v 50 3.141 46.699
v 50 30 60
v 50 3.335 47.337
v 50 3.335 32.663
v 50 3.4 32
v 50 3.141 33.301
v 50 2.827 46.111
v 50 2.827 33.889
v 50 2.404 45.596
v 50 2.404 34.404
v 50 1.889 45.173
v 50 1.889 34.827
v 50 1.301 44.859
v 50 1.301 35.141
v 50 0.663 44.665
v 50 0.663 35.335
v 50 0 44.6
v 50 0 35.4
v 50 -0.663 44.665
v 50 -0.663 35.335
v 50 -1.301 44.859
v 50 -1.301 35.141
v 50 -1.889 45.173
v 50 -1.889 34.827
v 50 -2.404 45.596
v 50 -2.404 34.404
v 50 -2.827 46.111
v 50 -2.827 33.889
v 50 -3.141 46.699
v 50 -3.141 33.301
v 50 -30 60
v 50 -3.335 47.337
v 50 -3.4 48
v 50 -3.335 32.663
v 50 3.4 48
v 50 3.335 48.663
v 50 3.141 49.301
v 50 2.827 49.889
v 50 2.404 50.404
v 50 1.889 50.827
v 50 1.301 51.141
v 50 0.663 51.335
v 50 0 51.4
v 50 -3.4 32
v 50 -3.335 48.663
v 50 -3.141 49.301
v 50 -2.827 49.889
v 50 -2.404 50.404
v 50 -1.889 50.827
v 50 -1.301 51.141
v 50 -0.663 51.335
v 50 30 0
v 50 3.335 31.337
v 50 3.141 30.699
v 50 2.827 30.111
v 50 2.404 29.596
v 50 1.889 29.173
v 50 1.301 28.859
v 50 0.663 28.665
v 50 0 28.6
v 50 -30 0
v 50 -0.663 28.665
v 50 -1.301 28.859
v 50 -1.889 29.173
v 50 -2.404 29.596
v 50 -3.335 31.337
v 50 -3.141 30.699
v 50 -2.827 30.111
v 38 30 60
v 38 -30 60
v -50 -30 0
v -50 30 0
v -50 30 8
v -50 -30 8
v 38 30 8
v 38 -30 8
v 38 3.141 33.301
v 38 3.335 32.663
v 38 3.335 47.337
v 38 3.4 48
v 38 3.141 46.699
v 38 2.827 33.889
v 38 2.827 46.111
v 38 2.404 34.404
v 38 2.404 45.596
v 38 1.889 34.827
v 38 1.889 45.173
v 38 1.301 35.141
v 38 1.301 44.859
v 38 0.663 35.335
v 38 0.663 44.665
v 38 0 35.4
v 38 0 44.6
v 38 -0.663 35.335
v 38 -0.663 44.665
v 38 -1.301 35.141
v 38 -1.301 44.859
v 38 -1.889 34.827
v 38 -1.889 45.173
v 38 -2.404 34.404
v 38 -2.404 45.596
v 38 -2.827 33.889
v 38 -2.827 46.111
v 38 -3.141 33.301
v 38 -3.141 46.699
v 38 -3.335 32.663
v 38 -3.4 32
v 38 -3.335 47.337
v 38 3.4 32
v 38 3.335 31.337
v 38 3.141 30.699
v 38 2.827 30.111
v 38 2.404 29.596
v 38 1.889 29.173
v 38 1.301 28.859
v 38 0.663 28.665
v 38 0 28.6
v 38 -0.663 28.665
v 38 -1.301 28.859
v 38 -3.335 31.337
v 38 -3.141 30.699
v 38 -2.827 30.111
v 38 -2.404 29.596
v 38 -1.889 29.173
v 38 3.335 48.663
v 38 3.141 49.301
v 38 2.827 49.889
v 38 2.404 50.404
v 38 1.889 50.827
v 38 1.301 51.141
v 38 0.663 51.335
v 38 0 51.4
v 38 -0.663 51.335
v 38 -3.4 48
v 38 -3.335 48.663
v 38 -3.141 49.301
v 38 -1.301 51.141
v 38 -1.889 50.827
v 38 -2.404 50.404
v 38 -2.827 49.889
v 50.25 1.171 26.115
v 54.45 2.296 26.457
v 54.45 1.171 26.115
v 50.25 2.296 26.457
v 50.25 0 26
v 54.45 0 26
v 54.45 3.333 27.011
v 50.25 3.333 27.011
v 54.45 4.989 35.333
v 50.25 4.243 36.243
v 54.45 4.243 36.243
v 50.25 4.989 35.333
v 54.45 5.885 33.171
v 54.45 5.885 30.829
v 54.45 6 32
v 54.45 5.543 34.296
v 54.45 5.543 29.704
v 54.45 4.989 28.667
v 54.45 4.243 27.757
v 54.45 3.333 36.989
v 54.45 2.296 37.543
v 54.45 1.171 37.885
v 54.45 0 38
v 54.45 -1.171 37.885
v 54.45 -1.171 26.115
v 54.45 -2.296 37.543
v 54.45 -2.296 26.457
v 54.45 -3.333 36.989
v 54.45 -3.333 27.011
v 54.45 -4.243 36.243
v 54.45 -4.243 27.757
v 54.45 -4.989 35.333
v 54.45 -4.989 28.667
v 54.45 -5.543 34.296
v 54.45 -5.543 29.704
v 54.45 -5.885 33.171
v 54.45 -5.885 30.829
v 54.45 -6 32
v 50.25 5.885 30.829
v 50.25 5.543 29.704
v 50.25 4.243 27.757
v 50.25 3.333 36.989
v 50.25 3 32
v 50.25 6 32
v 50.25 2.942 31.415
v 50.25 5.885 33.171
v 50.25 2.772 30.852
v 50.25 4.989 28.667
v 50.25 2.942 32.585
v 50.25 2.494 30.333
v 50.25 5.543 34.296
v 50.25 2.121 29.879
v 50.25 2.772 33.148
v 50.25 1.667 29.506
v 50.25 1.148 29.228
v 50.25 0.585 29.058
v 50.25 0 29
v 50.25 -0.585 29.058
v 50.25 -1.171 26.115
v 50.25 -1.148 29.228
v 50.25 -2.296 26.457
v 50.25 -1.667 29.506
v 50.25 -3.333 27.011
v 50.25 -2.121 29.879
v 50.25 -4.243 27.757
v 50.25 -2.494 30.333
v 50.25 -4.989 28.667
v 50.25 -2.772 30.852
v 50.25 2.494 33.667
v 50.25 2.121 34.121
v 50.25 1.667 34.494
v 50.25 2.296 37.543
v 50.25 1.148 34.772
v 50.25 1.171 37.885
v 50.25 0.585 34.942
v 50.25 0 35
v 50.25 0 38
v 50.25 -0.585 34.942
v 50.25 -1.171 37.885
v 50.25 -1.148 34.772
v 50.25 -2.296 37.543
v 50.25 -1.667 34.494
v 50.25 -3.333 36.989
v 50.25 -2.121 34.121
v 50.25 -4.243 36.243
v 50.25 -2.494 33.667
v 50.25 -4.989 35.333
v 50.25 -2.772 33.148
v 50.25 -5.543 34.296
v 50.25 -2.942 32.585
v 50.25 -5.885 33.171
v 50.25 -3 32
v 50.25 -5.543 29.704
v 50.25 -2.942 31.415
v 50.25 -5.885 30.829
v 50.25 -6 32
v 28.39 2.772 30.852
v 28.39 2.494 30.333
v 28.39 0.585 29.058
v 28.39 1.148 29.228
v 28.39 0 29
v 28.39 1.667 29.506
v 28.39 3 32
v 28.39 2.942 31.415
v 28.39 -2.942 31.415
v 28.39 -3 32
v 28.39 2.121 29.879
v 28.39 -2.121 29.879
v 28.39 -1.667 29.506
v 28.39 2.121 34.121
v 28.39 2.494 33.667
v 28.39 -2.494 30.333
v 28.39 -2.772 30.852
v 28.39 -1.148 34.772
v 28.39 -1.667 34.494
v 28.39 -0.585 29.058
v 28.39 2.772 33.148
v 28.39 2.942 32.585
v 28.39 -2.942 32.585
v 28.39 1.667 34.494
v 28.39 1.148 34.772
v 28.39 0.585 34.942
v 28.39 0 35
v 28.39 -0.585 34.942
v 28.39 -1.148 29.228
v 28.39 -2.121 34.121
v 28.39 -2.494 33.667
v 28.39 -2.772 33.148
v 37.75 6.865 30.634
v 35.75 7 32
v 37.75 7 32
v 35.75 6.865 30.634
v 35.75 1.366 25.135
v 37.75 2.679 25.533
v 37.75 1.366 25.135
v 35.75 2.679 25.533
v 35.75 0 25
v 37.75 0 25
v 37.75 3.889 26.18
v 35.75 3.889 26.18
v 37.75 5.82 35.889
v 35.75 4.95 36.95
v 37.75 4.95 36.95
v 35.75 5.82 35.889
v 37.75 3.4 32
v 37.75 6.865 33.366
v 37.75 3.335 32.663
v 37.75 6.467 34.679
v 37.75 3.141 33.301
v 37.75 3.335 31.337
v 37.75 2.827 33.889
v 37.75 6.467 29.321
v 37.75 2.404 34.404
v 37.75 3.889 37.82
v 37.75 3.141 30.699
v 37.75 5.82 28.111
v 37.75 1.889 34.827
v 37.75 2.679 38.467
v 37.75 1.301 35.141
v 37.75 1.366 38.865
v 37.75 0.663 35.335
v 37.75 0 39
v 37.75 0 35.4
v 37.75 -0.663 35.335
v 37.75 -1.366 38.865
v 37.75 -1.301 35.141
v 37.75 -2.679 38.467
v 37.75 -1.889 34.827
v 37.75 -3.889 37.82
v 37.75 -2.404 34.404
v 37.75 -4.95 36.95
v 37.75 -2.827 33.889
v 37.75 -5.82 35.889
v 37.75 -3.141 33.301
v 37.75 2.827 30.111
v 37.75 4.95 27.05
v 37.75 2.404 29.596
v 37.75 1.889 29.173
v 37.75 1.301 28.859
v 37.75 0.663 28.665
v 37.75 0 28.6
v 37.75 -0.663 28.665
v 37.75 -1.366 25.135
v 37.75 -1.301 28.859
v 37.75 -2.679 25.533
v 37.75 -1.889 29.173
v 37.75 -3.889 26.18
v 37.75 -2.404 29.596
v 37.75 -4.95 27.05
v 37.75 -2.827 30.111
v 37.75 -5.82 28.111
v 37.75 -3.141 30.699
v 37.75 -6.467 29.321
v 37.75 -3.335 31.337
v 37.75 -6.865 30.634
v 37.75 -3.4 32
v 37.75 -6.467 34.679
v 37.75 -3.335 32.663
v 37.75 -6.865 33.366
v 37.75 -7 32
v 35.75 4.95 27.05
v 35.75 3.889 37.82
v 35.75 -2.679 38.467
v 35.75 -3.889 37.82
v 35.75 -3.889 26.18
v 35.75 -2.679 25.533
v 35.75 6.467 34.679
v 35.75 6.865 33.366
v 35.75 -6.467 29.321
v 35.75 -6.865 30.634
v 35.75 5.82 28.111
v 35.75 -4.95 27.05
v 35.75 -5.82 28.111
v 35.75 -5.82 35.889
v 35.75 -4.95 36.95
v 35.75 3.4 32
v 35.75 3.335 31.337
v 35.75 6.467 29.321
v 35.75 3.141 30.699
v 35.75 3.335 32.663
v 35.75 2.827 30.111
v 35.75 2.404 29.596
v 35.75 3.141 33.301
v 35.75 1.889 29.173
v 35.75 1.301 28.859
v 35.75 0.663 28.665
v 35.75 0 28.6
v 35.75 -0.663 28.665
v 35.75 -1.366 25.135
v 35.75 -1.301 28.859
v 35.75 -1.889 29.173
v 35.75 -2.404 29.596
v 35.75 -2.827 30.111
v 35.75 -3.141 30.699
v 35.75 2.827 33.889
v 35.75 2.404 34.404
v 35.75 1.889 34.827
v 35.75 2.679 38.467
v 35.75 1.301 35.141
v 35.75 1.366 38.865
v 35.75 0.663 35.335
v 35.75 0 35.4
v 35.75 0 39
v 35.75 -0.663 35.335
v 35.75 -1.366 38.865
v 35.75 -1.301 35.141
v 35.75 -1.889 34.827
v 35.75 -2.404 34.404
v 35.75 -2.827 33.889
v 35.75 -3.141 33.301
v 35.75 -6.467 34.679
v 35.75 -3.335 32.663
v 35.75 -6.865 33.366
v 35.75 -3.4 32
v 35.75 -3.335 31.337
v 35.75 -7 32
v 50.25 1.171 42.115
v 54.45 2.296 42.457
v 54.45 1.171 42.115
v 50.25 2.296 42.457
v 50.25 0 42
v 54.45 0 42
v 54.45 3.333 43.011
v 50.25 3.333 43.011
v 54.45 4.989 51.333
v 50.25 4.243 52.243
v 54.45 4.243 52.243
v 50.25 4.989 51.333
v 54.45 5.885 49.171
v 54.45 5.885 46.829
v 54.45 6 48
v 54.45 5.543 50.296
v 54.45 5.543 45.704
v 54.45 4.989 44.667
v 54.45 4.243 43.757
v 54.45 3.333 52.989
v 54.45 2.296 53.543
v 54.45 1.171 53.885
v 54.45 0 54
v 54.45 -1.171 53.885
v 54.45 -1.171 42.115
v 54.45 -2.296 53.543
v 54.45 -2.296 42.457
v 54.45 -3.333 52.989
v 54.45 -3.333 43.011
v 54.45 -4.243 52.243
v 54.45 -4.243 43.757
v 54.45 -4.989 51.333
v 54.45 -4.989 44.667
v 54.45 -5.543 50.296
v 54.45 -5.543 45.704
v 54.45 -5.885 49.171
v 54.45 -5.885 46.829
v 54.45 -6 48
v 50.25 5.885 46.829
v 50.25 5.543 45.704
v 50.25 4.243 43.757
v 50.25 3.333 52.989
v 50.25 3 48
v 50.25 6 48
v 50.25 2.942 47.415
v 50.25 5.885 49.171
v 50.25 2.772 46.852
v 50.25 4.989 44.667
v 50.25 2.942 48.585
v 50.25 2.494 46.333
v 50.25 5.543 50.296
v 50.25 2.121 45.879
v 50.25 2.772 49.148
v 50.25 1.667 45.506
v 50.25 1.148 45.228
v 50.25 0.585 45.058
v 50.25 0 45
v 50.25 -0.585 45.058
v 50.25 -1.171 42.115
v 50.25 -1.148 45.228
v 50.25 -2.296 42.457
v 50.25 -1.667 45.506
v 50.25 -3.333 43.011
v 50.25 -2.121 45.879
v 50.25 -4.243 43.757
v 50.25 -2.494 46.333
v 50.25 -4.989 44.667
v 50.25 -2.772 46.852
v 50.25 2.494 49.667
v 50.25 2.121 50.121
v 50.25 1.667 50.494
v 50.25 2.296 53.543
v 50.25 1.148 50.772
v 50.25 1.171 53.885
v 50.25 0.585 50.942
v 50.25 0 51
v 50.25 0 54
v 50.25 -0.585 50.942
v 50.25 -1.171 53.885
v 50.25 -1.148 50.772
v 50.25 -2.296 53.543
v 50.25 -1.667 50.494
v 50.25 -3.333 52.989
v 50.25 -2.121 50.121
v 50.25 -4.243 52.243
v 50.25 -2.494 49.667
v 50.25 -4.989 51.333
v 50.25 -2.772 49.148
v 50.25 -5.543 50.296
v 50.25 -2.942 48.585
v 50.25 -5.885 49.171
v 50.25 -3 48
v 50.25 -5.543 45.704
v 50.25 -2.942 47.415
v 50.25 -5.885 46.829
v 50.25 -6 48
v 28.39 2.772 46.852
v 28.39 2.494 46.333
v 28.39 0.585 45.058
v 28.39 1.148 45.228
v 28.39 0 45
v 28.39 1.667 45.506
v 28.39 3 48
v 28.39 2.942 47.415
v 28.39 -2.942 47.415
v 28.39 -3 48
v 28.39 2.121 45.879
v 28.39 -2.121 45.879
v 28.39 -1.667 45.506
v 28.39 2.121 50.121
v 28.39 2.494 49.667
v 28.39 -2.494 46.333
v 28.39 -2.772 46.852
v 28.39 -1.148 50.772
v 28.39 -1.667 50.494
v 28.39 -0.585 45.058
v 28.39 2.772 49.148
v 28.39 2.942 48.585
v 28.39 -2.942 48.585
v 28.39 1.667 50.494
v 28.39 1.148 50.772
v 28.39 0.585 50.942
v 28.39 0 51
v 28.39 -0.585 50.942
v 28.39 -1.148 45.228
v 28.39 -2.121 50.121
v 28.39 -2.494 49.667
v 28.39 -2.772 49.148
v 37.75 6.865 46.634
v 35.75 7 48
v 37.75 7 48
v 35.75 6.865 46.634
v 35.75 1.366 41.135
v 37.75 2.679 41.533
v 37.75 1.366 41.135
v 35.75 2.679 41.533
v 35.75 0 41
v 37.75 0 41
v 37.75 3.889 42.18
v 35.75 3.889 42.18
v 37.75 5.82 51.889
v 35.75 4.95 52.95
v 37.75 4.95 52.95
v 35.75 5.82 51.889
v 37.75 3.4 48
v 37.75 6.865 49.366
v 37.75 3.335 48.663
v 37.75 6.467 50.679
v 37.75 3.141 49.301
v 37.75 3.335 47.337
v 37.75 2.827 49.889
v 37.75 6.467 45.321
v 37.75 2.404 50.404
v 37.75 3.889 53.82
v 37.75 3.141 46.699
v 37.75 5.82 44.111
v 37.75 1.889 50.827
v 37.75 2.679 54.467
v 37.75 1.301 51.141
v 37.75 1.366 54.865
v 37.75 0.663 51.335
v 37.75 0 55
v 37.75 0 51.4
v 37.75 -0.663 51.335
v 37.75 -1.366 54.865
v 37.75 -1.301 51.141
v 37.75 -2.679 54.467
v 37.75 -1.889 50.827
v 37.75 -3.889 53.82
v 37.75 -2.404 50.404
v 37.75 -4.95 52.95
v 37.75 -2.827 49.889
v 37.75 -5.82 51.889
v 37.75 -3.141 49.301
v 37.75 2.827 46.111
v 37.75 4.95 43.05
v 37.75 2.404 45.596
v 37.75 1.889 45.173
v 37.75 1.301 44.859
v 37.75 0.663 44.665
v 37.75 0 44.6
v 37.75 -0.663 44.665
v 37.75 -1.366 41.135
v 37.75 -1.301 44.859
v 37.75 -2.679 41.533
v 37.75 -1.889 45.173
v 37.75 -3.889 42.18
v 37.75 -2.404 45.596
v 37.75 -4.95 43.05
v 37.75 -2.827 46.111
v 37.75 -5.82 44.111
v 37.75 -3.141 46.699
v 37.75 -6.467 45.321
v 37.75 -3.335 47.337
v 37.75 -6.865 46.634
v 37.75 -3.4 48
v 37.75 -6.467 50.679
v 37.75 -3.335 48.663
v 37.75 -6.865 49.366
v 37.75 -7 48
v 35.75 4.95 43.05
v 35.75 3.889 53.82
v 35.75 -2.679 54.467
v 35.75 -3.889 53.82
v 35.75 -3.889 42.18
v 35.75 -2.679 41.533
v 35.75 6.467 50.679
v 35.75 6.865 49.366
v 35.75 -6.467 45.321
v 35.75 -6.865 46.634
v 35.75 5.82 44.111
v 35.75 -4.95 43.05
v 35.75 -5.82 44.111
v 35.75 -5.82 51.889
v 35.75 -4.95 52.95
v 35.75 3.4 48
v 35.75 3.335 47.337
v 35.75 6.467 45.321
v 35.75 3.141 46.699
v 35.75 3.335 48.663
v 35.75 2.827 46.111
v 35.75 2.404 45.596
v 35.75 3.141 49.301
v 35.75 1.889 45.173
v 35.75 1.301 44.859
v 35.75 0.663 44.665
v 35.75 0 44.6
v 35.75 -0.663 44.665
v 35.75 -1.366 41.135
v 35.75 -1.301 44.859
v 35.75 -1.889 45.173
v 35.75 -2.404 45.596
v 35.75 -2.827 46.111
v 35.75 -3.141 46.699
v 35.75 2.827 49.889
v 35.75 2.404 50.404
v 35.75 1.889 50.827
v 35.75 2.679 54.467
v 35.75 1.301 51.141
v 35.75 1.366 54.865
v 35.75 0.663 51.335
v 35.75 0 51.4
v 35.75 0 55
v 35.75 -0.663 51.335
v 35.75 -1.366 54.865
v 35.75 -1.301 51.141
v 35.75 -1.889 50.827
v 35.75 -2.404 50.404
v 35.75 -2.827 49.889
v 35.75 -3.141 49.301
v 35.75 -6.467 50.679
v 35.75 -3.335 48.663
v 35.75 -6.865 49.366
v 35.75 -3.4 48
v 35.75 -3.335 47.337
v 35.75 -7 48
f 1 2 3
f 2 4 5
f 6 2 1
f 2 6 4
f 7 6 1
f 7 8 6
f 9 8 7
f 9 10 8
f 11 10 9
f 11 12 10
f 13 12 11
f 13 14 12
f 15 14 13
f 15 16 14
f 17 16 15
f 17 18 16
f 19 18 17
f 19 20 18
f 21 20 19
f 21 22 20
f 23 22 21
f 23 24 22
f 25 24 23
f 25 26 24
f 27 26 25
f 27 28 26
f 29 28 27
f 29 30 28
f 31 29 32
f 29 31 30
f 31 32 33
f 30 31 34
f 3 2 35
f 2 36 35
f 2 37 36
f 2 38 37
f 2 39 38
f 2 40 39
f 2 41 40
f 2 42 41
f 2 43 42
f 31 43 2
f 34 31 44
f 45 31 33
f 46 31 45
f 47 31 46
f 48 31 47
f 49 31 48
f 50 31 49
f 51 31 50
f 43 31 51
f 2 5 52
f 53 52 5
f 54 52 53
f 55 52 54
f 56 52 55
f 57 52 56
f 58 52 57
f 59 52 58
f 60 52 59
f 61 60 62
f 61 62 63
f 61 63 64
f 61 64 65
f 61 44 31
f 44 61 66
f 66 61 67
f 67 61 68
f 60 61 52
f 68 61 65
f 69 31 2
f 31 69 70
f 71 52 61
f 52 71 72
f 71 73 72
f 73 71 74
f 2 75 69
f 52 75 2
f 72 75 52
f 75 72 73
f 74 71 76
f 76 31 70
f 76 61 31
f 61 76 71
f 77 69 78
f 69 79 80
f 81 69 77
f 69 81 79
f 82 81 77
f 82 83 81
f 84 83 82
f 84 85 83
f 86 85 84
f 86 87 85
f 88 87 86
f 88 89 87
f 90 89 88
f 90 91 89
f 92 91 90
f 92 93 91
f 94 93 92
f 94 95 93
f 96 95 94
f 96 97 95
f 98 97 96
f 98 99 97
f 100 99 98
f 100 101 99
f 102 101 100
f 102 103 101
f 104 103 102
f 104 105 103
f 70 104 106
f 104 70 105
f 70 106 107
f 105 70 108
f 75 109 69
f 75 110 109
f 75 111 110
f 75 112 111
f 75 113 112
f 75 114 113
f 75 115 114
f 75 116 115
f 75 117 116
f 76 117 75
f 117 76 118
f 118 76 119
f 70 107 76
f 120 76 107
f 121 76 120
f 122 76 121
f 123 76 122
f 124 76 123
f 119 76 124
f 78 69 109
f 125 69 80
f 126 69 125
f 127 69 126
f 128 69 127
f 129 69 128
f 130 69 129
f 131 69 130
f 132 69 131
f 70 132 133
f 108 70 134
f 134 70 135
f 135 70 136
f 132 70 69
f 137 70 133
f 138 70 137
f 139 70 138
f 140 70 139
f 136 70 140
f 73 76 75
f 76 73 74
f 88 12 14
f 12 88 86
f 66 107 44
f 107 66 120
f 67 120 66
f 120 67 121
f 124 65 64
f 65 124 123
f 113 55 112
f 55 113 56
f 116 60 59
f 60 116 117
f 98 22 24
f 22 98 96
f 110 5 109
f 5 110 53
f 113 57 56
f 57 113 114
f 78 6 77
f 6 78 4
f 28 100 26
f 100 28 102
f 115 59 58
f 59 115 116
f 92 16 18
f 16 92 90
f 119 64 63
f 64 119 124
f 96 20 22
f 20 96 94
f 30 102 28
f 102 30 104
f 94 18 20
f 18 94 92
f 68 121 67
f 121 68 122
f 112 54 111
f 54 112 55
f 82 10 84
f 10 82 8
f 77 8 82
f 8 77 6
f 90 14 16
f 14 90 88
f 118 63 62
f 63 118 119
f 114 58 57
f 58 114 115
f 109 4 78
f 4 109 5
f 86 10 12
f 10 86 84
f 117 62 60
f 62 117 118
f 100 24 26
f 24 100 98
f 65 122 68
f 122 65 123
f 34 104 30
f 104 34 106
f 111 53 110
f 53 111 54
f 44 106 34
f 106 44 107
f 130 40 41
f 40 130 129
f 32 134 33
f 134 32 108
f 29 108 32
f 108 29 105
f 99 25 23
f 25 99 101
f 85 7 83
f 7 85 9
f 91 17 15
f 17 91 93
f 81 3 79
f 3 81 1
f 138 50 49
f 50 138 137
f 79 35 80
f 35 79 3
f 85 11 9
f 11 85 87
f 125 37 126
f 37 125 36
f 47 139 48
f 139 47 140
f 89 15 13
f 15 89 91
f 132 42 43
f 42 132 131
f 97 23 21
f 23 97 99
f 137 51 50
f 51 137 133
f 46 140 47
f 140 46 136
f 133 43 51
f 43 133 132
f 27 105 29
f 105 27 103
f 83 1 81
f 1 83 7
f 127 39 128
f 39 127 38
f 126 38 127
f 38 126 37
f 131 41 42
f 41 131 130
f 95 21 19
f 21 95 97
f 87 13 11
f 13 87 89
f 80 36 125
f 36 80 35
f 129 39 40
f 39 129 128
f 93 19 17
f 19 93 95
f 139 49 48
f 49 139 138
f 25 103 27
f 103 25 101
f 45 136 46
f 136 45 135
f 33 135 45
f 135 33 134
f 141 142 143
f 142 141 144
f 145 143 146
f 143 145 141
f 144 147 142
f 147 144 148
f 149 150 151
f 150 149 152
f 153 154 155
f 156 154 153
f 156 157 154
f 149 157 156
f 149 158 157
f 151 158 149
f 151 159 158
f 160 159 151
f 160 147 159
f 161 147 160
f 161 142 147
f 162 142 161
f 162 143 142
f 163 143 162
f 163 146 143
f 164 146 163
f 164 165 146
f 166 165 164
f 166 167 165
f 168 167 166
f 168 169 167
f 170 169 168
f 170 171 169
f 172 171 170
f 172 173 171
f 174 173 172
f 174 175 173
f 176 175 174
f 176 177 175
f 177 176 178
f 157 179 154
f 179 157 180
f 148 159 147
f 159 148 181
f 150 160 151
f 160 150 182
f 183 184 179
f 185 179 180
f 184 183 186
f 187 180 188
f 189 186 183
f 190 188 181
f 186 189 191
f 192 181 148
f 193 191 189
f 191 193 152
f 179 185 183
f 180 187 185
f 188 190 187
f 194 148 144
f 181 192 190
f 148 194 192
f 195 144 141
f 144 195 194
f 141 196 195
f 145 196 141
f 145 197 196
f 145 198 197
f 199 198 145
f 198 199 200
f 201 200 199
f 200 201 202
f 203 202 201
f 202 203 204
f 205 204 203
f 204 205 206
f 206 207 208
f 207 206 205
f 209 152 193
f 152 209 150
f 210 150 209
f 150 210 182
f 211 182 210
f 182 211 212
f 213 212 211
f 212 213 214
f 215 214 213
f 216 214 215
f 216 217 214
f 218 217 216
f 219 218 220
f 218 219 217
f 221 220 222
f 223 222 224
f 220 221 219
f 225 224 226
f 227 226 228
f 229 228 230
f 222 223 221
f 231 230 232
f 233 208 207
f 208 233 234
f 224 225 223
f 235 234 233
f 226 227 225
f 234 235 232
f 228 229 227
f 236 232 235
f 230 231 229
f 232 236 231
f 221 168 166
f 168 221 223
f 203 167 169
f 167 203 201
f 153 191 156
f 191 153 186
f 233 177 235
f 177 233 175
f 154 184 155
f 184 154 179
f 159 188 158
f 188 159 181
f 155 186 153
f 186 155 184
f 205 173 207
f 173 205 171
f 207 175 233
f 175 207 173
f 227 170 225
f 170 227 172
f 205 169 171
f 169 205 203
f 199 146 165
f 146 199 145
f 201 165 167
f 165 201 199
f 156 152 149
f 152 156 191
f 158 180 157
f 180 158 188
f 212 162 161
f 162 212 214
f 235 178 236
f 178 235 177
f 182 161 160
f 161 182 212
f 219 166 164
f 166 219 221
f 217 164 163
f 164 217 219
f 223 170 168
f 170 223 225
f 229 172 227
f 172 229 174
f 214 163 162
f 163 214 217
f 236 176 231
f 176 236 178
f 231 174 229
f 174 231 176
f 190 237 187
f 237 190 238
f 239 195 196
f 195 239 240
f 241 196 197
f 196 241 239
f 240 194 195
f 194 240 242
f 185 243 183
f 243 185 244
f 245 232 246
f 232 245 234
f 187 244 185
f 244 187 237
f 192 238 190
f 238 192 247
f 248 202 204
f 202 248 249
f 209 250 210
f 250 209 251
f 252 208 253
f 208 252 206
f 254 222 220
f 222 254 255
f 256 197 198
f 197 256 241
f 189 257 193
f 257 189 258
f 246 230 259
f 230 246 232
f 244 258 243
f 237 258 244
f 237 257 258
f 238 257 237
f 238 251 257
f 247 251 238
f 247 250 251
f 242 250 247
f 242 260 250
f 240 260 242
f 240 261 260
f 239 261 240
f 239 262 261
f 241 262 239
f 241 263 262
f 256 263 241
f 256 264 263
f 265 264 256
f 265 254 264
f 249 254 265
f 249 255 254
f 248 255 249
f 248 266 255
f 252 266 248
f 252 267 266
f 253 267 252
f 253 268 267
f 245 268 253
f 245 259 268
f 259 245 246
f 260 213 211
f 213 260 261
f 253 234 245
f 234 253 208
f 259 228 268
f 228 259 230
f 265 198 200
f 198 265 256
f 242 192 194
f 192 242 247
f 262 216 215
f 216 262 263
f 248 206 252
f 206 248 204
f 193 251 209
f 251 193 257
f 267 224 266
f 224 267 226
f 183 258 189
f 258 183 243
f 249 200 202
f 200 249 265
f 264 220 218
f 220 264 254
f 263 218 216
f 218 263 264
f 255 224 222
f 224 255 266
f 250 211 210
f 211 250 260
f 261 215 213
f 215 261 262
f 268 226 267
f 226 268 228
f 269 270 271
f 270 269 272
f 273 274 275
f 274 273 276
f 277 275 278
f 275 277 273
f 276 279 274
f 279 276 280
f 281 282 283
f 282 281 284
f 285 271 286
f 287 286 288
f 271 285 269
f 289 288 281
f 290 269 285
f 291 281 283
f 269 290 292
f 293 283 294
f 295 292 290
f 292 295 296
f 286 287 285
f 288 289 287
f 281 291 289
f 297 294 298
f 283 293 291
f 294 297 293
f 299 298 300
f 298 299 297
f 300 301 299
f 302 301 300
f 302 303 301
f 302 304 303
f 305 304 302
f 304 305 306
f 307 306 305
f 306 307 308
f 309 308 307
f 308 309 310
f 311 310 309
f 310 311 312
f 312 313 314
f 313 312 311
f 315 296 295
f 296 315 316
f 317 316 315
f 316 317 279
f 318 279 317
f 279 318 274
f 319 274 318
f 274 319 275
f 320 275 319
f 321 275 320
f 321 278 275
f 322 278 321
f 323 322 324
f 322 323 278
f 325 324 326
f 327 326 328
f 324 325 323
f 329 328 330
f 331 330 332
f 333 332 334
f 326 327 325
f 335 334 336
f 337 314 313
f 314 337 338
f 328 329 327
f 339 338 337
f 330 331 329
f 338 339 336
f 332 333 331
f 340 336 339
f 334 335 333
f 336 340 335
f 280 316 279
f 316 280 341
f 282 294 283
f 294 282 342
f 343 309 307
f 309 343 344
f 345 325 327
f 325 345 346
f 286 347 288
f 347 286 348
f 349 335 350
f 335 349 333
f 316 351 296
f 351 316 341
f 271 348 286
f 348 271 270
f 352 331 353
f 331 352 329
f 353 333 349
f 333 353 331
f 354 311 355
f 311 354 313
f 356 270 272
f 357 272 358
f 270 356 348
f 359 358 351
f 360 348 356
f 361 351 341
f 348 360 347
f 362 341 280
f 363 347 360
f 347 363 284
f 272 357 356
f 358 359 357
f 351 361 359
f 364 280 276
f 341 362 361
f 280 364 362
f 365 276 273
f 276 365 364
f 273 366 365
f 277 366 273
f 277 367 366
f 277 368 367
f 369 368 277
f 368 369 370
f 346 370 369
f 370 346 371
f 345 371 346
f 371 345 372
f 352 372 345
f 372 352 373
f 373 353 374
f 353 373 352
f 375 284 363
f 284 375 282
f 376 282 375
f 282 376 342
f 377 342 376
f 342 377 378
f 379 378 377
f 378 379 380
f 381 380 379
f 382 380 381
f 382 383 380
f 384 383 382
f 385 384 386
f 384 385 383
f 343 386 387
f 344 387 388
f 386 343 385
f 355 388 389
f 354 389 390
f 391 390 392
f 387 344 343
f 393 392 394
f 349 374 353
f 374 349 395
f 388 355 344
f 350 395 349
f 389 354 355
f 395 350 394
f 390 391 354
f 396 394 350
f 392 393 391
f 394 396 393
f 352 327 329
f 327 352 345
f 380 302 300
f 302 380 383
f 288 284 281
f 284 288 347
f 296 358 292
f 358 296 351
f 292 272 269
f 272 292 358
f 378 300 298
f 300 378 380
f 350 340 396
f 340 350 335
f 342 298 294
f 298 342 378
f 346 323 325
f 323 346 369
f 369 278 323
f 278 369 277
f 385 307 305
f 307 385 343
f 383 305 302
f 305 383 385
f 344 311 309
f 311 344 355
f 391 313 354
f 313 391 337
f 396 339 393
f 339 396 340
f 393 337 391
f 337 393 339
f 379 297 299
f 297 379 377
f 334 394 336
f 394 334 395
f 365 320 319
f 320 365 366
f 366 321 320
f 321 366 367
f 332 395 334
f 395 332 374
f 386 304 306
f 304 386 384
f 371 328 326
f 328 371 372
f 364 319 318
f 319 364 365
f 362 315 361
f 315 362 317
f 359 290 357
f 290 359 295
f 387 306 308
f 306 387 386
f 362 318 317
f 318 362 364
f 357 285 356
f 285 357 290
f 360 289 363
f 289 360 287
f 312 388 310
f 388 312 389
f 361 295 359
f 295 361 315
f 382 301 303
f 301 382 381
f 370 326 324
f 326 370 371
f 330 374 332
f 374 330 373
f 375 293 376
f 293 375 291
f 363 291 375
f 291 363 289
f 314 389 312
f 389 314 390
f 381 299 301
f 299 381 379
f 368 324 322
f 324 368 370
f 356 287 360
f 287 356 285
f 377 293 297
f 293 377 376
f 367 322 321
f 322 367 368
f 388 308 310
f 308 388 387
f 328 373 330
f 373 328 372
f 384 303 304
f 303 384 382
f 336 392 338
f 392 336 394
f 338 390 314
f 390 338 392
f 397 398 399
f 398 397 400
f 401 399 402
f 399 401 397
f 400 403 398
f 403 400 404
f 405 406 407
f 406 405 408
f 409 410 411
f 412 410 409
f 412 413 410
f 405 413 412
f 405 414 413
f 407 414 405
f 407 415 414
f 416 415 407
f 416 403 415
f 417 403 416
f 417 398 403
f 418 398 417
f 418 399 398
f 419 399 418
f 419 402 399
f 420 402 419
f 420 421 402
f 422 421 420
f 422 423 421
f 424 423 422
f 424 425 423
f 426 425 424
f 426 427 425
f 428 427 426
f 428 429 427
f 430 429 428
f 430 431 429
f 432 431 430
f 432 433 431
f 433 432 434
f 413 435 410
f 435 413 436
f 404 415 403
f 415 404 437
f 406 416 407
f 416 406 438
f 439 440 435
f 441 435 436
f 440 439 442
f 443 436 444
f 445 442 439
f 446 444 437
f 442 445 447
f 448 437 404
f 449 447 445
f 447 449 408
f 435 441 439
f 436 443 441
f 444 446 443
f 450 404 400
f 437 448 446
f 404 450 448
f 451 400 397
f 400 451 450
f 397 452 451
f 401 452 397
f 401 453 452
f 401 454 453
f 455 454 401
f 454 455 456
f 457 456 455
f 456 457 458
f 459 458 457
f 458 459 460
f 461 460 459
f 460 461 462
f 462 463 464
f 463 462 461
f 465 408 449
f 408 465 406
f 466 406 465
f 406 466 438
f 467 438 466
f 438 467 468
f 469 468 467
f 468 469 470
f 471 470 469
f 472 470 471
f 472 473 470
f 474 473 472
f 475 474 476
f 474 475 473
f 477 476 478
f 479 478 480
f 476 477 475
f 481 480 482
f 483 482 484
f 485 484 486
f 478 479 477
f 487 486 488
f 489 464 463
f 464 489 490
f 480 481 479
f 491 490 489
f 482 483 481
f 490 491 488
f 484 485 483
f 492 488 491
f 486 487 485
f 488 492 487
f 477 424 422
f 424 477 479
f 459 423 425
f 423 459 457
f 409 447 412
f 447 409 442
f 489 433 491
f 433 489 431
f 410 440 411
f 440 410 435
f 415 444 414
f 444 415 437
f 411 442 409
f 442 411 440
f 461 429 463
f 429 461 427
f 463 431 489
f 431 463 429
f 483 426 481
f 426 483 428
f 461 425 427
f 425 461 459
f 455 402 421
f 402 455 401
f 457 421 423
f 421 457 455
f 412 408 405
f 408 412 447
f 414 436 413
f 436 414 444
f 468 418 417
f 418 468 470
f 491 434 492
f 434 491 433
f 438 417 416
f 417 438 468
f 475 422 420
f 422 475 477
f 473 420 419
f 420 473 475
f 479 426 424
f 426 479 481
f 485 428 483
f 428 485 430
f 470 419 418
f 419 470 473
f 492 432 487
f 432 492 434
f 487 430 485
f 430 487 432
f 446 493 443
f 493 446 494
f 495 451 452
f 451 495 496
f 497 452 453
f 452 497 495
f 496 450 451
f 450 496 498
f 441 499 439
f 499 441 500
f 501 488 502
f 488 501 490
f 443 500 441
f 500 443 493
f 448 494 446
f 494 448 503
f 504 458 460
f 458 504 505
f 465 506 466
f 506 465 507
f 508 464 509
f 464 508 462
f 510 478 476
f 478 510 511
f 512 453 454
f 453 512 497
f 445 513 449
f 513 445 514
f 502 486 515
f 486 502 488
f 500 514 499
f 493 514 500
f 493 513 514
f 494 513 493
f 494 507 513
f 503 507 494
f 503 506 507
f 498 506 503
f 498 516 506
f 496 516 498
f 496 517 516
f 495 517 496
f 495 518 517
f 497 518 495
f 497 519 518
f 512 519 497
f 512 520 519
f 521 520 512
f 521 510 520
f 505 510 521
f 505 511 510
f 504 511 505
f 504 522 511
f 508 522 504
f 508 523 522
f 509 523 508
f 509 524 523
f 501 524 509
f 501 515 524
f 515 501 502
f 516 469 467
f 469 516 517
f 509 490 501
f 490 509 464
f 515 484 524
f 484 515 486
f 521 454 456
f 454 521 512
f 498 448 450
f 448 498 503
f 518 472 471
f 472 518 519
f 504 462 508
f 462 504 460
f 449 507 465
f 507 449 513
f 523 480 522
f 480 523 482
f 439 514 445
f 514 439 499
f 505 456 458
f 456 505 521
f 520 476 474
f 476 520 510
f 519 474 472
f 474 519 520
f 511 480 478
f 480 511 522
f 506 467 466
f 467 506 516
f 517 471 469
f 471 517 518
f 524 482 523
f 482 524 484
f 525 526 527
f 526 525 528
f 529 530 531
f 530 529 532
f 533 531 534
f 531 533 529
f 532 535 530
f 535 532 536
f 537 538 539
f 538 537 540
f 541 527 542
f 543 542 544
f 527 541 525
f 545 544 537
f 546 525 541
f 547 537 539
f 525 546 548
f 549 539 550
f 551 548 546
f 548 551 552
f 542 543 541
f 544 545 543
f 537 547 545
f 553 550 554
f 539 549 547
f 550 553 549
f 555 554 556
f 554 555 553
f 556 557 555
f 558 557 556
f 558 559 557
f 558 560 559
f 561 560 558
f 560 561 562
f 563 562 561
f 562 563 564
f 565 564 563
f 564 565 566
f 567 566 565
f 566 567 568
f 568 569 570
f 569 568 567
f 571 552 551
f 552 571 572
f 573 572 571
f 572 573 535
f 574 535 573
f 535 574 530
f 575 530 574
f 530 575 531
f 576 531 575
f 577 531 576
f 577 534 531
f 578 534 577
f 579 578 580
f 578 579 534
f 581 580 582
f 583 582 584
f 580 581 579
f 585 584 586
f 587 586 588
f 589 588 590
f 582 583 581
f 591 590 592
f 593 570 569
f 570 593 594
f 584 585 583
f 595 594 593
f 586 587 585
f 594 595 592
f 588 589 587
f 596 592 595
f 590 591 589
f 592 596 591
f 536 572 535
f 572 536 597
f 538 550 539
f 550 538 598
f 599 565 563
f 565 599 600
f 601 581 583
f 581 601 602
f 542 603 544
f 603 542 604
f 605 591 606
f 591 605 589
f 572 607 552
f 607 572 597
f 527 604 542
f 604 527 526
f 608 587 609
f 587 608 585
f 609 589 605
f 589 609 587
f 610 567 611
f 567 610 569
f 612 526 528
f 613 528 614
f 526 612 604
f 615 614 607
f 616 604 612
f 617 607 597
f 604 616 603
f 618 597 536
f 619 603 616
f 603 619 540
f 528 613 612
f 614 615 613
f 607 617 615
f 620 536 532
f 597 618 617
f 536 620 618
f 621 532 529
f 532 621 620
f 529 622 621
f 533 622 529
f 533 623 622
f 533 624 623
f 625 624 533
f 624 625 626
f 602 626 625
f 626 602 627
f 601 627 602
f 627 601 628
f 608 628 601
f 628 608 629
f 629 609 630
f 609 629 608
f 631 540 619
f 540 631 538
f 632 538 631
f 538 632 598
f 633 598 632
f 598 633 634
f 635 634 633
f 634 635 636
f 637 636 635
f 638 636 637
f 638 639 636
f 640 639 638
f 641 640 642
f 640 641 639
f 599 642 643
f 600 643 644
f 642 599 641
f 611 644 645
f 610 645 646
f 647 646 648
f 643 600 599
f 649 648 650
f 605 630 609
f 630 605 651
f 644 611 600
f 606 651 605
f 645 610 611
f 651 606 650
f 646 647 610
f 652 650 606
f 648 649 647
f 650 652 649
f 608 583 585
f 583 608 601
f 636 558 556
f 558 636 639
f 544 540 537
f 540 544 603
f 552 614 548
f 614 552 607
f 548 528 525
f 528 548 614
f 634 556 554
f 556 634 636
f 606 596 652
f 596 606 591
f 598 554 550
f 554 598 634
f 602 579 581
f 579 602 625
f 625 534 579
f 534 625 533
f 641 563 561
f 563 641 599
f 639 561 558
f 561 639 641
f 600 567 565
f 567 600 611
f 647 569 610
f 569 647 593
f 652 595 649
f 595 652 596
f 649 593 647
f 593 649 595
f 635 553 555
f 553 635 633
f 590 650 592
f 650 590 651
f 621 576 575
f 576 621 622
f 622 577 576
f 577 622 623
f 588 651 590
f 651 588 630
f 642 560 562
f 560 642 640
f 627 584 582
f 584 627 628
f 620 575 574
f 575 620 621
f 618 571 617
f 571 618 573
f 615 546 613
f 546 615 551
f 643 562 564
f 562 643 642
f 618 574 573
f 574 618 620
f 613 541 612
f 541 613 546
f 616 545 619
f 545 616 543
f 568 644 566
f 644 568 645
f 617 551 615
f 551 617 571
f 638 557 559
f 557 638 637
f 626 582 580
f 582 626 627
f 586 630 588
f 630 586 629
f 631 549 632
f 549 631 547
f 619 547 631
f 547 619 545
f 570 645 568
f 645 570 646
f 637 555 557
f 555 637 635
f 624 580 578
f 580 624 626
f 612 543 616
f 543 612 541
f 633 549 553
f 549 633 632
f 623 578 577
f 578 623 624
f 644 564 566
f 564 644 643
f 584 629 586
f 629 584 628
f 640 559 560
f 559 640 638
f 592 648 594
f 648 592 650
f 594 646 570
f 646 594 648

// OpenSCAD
$fn = 32;

// ------------------------------------------------------------------------
// Bolted bracket: 100 x 60 mm bracket with 2 bolt joints
// Every part is its own module, assembly() places them once.
// ------------------------------------------------------------------------

// --- part 1 ---
module bracket() {
  difference() {
    translate([-50, -30, 0]) cube([100, 60, 60]);
    translate([-51, -31, 8]) cube([89, 62, 53]);
    translate([44, 0, 32]) rotate([0, 90, 0]) cylinder(h = 14, d = 6.8, center = true);
    translate([44, 0, 48]) rotate([0, 90, 0]) cylinder(h = 14, d = 6.8, center = true);
  }
}

// --- part 2 ---
module bolt1() {
  cylinder(h = 4.2, d = 12);
  translate([0, 0, -21.86]) cylinder(h = 21.86, d = 6);
}

// --- part 3 ---
module washer1() {
  difference() {
      translate([0, 0, 0]) cylinder(h = 2, d = 14);
      translate([0, 0, -1]) cylinder(h = 4, d = 6.8);
    }
}

// --- part 4 ---
module bolt2() {
  cylinder(h = 4.2, d = 12);
  translate([0, 0, -21.86]) cylinder(h = 21.86, d = 6);
}

// --- part 5 ---
module washer2() {
  difference() {
      translate([0, 0, 0]) cylinder(h = 2, d = 14);
      translate([0, 0, -1]) cylinder(h = 4, d = 6.8);
    }
}

// --- assembly ---
module assembly() {
  translate([0, 0, 0]) rotate([0, 0, 0]) bracket();
  translate([50.25, 0, 32]) rotate([0, 90, 0]) bolt1();
  translate([35.75, 0, 32]) rotate([0, 90, 0]) washer1();
  translate([50.25, 0, 48]) rotate([0, 90, 0]) bolt2();
  translate([35.75, 0, 48]) rotate([0, 90, 0]) washer2();
}

assembly();
